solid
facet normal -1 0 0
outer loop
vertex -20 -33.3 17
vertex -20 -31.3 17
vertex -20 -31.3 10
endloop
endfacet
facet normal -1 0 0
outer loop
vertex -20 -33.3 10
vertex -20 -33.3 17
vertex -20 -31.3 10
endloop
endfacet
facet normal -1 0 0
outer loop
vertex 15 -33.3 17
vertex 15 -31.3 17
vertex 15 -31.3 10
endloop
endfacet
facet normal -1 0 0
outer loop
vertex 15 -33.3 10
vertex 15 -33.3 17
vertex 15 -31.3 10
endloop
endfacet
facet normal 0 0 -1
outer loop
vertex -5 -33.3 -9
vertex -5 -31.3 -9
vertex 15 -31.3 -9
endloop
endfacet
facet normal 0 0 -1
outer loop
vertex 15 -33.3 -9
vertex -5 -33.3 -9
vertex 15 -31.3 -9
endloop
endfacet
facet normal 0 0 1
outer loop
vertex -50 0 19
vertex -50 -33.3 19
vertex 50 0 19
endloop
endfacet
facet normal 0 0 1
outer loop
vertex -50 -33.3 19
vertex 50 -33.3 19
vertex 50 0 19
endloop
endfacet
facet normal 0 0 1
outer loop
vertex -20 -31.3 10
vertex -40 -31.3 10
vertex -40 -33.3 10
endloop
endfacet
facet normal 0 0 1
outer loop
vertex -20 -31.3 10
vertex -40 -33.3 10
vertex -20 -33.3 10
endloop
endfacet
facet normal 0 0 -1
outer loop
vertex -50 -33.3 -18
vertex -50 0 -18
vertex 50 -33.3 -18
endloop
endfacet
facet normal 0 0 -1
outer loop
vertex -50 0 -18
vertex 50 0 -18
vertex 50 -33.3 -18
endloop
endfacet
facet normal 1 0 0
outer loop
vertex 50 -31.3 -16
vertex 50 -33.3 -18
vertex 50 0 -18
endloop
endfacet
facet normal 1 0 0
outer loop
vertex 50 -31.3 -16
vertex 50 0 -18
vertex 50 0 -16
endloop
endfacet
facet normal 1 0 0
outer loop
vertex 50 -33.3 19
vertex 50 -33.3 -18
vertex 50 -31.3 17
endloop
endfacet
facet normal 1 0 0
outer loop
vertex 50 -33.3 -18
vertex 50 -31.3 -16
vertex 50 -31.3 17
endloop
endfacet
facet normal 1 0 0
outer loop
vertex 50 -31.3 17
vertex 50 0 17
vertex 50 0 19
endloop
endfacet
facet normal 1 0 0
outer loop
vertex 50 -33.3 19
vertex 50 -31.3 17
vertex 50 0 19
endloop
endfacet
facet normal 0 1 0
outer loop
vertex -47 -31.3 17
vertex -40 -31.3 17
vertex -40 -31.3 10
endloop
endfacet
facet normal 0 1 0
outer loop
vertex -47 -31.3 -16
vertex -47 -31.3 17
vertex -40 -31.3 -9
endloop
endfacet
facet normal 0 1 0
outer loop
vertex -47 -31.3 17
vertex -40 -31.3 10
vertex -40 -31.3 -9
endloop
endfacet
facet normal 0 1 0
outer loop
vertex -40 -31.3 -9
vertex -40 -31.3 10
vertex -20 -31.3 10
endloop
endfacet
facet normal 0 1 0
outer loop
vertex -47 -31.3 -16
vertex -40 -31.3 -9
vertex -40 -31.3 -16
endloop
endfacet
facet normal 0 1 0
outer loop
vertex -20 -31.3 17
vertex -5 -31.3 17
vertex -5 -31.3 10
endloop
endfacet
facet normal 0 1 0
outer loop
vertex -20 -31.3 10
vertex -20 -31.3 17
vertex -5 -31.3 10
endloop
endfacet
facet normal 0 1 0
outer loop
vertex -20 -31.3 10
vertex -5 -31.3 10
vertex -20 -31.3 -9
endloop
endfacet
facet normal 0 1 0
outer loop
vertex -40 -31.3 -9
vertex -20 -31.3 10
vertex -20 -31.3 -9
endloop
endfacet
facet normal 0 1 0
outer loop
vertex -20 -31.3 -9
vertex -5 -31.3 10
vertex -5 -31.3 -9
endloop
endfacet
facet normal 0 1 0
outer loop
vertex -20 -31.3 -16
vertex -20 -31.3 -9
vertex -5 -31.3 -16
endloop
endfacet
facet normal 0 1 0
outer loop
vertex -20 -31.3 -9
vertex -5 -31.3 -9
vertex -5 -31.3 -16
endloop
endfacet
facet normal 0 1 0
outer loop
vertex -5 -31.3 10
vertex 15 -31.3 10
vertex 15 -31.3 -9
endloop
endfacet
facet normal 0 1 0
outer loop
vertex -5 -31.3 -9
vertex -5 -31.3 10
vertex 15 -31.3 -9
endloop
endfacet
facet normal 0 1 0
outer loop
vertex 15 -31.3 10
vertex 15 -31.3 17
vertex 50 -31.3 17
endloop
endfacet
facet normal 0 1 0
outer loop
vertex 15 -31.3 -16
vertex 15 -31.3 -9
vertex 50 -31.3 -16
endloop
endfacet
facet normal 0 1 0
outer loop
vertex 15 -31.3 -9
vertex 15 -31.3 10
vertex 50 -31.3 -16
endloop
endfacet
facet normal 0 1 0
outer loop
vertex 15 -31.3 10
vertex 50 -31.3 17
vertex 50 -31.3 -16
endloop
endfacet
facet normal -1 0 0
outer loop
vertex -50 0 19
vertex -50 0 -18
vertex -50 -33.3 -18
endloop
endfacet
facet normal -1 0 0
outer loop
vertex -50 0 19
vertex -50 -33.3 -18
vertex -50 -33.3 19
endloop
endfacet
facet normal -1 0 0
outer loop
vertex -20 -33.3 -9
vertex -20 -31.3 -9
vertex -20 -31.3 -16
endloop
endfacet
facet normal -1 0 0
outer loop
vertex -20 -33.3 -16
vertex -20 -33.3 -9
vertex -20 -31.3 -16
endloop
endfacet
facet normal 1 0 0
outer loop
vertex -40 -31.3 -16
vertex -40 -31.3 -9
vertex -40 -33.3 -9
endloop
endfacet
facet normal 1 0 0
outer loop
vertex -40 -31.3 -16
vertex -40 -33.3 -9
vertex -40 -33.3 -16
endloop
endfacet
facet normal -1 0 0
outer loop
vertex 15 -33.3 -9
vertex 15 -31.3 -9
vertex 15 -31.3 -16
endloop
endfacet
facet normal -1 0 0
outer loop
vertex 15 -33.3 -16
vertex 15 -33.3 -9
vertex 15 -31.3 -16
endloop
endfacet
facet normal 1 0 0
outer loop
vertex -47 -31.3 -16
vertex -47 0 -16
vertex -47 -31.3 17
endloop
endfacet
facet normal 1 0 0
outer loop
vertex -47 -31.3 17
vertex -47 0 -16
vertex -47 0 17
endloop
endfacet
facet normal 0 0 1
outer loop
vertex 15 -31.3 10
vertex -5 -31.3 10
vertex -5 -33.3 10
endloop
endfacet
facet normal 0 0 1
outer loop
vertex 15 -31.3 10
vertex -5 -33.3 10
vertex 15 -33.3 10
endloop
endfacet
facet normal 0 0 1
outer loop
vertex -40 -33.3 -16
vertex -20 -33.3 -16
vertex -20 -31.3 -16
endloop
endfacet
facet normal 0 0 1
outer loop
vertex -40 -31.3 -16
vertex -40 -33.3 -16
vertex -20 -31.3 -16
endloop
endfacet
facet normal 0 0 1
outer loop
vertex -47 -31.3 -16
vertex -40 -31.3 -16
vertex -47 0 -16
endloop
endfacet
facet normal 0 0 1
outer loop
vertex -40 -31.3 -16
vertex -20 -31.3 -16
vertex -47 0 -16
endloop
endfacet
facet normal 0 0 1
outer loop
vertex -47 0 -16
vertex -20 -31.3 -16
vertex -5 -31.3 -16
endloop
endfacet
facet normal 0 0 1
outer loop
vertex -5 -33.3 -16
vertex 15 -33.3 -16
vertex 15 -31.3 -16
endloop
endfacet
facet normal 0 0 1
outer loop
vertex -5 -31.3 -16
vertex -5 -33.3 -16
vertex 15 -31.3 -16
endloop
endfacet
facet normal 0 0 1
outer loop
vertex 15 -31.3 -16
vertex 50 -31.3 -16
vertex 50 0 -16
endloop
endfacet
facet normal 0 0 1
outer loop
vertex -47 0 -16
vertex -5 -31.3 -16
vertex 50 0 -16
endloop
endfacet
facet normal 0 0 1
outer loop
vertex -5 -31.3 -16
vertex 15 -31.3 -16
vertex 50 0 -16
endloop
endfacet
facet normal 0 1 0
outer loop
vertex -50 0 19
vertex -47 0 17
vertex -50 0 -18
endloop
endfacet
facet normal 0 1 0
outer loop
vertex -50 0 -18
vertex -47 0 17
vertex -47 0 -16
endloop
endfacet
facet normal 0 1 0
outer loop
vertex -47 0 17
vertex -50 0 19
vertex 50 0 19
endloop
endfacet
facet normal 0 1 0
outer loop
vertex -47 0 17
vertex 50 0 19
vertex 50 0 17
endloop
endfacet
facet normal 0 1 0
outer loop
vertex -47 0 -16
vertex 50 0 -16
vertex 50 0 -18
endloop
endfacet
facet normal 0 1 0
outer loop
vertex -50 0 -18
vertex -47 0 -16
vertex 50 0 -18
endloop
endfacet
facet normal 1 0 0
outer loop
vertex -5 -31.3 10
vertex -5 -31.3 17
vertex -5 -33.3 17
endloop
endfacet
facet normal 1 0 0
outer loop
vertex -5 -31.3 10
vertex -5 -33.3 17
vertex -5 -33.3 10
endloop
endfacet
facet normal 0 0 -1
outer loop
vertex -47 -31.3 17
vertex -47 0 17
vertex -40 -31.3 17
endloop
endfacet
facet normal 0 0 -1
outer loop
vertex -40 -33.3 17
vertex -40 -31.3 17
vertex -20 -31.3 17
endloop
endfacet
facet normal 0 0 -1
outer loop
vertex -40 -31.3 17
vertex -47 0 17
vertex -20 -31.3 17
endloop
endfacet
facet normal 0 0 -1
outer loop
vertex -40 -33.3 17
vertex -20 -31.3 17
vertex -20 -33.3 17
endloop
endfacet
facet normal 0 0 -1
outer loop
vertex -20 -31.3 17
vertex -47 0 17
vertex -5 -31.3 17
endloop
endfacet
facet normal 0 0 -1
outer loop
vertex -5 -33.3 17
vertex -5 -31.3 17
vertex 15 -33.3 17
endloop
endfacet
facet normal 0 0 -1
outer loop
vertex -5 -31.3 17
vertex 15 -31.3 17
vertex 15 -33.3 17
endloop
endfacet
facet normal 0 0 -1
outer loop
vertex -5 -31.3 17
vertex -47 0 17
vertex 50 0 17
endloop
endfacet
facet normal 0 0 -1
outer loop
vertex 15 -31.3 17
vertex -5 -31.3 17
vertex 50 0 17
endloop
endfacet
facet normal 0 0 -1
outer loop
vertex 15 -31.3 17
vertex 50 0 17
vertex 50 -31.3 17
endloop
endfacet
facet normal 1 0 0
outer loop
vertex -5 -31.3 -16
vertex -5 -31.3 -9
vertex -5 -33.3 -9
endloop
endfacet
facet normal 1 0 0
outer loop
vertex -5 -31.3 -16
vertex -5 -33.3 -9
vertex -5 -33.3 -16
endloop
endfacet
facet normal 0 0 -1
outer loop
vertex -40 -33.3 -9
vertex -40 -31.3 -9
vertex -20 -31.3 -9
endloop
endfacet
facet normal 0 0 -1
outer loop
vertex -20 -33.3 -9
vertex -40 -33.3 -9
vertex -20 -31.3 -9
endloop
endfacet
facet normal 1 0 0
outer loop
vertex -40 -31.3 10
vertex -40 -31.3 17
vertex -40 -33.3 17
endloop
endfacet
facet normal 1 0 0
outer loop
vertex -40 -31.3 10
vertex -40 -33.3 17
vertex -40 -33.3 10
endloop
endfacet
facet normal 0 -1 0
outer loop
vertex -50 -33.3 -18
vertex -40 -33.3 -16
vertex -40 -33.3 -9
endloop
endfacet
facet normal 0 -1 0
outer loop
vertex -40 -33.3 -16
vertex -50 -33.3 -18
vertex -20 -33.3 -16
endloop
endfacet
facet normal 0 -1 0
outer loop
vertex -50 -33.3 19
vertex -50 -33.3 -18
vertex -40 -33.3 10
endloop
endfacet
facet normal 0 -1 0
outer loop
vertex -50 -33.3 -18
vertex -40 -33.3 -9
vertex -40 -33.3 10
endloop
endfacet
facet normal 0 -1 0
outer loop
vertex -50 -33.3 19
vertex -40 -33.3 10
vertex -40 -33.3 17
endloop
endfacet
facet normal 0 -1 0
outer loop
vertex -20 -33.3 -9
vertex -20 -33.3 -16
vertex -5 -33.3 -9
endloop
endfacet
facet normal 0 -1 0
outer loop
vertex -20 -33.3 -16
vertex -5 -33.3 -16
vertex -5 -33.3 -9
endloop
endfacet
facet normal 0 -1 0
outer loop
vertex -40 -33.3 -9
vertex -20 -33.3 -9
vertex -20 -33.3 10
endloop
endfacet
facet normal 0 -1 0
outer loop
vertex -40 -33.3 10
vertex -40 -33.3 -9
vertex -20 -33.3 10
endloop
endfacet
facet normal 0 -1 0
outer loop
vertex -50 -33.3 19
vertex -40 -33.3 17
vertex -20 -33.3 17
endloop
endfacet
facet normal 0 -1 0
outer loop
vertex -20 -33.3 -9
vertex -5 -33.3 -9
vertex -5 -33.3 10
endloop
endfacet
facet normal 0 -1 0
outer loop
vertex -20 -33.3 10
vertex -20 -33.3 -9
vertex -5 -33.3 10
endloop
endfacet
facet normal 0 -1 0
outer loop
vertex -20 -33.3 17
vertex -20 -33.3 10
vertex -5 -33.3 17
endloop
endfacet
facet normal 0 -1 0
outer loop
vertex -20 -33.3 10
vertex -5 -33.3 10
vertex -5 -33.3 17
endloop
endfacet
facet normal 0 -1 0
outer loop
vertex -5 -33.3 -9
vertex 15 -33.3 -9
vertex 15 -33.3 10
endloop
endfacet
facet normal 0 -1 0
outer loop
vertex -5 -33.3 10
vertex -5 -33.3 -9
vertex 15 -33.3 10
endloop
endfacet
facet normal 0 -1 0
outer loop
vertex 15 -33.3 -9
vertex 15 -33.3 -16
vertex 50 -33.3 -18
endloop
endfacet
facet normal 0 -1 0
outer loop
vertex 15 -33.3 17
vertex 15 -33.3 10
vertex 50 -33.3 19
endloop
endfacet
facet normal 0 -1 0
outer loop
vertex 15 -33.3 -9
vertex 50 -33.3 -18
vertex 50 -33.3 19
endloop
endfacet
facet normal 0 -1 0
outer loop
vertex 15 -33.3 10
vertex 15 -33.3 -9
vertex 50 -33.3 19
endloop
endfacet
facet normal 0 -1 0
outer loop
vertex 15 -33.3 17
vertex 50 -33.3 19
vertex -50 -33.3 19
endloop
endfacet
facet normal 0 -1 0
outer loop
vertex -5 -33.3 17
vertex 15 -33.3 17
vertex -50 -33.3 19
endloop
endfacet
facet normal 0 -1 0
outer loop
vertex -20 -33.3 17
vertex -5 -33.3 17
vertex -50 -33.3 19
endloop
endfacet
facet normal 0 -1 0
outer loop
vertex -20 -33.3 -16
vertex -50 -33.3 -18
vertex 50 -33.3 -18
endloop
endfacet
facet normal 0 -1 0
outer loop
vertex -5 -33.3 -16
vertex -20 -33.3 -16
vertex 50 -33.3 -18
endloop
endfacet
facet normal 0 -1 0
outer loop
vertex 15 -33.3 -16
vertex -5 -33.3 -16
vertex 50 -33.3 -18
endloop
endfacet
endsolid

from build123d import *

# Parameters (mm, degrees)
BOSS_EXTRUDE1_DEPTH = 50
SKETCH2_W           = 37
SKETCH2_H           = 33.3
BOSS_EXTRUDE2_DEPTH = 3
SKETCH3_W           = 20
SKETCH3_H           = 7
CUT_EXTRUDE1_DEPTH  = 50


with BuildPart() as part:
    # Sketch1 → Boss-Extrude1 (new body, symmetric)
    with BuildSketch(Plane(origin=(0, 0, 0), x_dir=(0, 0, -1), z_dir=(1, 0, 0))):
        Polygon((16, 0), (18, 0), (18, -33.3), (-19, -33.3), (-19, 0), (-17, 0), (-17, -31.3), (16, -31.3), align=None)
    extrude(amount=BOSS_EXTRUDE1_DEPTH, both=True)

    # Sketch2 → Boss-Extrude2 (add)
    with BuildSketch(Plane.ZY.offset(50)):
        with Locations((0.5, -16.65)):
            Rectangle(SKETCH2_W, SKETCH2_H)
    extrude(amount=-BOSS_EXTRUDE2_DEPTH)

    # Sketch3 → Cut-Extrude1 (cut)
    with BuildSketch(Plane(origin=(0, 0, 0), x_dir=(1, 0, 0), z_dir=(0, 1, 0))):
        with Locations((-30, -13.5)):
            Rectangle(SKETCH3_W, SKETCH3_H)
        with Locations((5, -13.5)):
            Rectangle(SKETCH3_W, SKETCH3_H)
        with Locations((-30, 12.5)):
            Rectangle(SKETCH3_W, SKETCH3_H)
        with Locations((5, 12.5)):
            Rectangle(SKETCH3_W, SKETCH3_H)
    extrude(amount=-CUT_EXTRUDE1_DEPTH, mode=Mode.SUBTRACT)


solid = part.part
